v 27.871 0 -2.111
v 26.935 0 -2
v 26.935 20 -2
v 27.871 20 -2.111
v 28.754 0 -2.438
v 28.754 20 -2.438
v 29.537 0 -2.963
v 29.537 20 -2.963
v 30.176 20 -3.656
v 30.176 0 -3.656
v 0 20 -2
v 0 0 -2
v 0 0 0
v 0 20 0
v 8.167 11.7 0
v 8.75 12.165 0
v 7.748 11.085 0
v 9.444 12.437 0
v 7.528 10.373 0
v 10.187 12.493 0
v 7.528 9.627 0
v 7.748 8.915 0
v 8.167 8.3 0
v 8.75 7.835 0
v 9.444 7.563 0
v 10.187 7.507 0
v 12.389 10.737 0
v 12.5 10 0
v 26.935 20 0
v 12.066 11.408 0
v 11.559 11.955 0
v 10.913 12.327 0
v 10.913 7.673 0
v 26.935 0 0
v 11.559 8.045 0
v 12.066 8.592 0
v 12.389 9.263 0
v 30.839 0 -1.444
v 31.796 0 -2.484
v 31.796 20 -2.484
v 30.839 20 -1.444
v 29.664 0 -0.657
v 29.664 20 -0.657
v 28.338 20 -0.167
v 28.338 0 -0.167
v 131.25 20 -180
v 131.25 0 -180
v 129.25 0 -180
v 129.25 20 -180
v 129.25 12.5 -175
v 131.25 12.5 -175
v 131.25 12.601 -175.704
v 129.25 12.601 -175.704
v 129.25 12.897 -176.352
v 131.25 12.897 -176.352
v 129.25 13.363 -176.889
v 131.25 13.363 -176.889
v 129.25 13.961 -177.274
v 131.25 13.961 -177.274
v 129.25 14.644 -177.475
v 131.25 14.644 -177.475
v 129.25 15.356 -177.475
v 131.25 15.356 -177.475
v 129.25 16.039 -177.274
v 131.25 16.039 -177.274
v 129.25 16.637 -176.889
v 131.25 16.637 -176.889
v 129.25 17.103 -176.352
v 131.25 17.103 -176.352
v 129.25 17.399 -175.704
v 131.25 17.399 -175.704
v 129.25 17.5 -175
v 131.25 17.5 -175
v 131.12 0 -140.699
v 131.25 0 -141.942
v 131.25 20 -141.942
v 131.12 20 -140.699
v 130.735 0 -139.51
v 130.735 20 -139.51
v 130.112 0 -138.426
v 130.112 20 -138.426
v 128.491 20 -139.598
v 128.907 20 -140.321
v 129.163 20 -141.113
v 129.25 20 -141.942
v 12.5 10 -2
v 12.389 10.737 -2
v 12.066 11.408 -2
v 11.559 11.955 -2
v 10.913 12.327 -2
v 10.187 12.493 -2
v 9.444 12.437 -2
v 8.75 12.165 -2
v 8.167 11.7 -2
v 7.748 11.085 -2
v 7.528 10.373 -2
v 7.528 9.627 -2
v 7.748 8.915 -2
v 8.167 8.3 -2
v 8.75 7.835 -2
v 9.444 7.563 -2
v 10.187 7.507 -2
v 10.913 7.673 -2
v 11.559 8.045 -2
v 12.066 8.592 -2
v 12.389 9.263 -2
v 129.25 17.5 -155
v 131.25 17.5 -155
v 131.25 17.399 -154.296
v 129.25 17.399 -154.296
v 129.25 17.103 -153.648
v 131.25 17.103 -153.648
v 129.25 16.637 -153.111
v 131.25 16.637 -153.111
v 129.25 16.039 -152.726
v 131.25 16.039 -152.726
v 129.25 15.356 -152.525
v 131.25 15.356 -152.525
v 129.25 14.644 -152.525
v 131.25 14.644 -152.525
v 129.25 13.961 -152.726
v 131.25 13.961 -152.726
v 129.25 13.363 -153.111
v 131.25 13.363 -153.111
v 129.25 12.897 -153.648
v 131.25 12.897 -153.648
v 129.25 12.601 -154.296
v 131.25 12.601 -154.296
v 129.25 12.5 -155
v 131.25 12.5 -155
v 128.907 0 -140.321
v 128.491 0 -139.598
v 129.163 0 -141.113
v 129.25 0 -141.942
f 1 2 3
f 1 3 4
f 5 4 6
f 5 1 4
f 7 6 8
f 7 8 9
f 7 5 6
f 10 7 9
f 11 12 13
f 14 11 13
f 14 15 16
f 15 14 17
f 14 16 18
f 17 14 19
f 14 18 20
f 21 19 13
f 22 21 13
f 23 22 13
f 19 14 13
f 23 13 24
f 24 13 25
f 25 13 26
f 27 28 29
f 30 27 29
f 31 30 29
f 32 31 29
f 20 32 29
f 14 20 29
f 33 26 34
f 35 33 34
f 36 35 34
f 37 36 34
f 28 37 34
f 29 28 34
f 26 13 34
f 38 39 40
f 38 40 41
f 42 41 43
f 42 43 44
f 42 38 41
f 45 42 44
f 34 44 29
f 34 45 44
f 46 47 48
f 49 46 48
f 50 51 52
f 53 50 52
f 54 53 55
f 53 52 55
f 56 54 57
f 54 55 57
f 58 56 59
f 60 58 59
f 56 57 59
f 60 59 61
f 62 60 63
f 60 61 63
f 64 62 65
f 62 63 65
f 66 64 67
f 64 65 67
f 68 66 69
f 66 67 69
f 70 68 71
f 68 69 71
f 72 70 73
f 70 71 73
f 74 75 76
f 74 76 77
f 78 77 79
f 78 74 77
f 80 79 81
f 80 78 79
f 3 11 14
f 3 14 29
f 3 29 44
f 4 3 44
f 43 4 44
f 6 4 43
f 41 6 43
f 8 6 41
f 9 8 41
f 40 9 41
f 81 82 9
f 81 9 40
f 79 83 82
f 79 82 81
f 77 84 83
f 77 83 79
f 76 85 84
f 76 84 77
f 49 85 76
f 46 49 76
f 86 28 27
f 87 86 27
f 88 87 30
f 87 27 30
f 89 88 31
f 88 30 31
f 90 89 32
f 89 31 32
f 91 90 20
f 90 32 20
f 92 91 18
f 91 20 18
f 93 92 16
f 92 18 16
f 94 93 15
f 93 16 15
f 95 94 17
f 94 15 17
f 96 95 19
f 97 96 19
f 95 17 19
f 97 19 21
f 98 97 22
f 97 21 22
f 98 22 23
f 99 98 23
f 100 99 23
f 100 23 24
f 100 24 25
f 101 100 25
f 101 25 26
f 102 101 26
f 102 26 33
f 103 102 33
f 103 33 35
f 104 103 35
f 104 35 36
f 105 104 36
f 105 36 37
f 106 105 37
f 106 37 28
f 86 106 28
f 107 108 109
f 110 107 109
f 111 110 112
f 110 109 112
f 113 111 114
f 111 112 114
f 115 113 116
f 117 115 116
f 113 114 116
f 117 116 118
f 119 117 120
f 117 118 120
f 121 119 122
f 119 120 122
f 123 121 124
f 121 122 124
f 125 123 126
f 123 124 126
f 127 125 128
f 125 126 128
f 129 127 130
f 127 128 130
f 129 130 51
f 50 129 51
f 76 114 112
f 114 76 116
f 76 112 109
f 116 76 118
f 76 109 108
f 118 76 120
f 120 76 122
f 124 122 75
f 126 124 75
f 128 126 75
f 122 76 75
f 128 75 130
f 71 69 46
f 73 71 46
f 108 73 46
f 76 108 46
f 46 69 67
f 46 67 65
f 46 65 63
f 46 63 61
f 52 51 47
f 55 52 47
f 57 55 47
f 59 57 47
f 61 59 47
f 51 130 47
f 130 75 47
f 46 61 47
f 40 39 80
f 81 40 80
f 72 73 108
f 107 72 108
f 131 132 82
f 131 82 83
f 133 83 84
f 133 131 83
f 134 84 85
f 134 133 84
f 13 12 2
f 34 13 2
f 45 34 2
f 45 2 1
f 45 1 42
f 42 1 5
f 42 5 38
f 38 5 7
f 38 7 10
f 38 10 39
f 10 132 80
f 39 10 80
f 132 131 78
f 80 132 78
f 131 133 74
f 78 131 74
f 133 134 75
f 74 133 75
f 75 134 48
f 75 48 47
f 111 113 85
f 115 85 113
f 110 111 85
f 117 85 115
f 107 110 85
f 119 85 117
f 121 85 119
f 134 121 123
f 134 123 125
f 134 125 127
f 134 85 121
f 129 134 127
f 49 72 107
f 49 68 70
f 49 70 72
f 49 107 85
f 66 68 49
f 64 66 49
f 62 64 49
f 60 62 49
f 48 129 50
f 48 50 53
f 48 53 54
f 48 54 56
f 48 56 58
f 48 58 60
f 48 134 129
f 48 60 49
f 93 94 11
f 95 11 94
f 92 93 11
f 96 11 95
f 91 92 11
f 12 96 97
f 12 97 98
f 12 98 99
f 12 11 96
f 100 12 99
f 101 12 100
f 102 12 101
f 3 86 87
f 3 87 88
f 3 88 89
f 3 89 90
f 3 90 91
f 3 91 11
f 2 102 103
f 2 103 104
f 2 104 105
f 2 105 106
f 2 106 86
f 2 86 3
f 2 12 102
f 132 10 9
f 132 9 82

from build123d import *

# Parameters (mm, degrees)
BOSS_EXTRUDE1_DEPTH  = 20
CONVERT_SOLID2_DEPTH = 20
SKETCH8_R            = 2.5
CUT_EXTRUDE1_DEPTH   = 20
CUT_EXTRUDE2_DEPTH   = 10


# Read off the part's stored shape, not the designer's step: Convert-Solid2
with BuildPart() as part:
    # Sketch1 → Boss-Extrude1 (new body)
    with BuildSketch(Plane(origin=(0, 0, 0), x_dir=(1, 0, 0), z_dir=(0, 1, 0))):
        Polygon((0, 0), (30, 0), (131.25, 140), (131.25, 180), (126.25, 180), (126.25, 141.618570234), (27.445498313, 5), (0, 5), align=None)
    extrude(amount=BOSS_EXTRUDE1_DEPTH)

    # Convert-Solid2 outline → Convert-Solid2 (cut)
    with BuildSketch(Plane(origin=(0, 0, 0), x_dir=(1, 0, 0), z_dir=(0, 1, 0))):
        with BuildLine():
            Line((30, 0), (31.796383005, 2.483887612))
            ThreePointArc((31.796383005, 2.483887612), (29.664371379, 0.656935602), (26.934597975, 0))
            Line((26.934597975, 0), (30, 0))
        make_face()
        with BuildLine():
            ThreePointArc((131.25, 141.942284281), (130.958358353, 140.094408498), (130.11178503, 138.426171893))
            Line((130.11178503, 138.426171893), (131.25, 140))
            Line((131.25, 140), (131.25, 141.942284281))
        make_face()
        with BuildLine():
            Line((0, 5), (0, 2))
            Line((0, 2), (26.934597975, 2))
            ThreePointArc((26.934597975, 2), (28.754446911, 2.437957068), (30.175787995, 3.655925075))
            Line((30.175787995, 3.655925075), (128.49119002, 139.598209356))
            ThreePointArc((128.49119002, 139.598209356), (129.055572236, 140.710367092), (129.25, 141.942284281))
            Line((129.25, 141.942284281), (129.25, 180))
            Line((129.25, 180), (126.25, 180))
            Line((126.25, 180), (126.25, 141.618570234))
            Line((126.25, 141.618570234), (27.445498313, 5))
            Line((27.445498313, 5), (0, 5))
        make_face()
    extrude(amount=CONVERT_SOLID2_DEPTH, mode=Mode.SUBTRACT)

    # Sketch8 → Cut-Extrude1 (cut)
    with BuildSketch(Plane.XY):
        with Locations((10, 10)):
            Circle(SKETCH8_R)
    extrude(amount=-CUT_EXTRUDE1_DEPTH, mode=Mode.SUBTRACT)

    # Sketch9 → Cut-Extrude2 (cut)
    with BuildSketch(Plane(origin=(131.25, 0, -320.372504423), x_dir=(0, 0, 1), z_dir=(-1, 0, 0))):
        with BuildLine():
            Line((145.372504423, 17.5), (165.372504423, 17.5))
            ThreePointArc((165.372504423, 17.5), (167.872504423, 15), (165.372504423, 12.5))
            Line((165.372504423, 12.5), (145.372504423, 12.5))
            ThreePointArc((145.372504423, 12.5), (142.872504423, 15), (145.372504423, 17.5))
        make_face()
    extrude(amount=CUT_EXTRUDE2_DEPTH, mode=Mode.SUBTRACT)


solid = part.part
